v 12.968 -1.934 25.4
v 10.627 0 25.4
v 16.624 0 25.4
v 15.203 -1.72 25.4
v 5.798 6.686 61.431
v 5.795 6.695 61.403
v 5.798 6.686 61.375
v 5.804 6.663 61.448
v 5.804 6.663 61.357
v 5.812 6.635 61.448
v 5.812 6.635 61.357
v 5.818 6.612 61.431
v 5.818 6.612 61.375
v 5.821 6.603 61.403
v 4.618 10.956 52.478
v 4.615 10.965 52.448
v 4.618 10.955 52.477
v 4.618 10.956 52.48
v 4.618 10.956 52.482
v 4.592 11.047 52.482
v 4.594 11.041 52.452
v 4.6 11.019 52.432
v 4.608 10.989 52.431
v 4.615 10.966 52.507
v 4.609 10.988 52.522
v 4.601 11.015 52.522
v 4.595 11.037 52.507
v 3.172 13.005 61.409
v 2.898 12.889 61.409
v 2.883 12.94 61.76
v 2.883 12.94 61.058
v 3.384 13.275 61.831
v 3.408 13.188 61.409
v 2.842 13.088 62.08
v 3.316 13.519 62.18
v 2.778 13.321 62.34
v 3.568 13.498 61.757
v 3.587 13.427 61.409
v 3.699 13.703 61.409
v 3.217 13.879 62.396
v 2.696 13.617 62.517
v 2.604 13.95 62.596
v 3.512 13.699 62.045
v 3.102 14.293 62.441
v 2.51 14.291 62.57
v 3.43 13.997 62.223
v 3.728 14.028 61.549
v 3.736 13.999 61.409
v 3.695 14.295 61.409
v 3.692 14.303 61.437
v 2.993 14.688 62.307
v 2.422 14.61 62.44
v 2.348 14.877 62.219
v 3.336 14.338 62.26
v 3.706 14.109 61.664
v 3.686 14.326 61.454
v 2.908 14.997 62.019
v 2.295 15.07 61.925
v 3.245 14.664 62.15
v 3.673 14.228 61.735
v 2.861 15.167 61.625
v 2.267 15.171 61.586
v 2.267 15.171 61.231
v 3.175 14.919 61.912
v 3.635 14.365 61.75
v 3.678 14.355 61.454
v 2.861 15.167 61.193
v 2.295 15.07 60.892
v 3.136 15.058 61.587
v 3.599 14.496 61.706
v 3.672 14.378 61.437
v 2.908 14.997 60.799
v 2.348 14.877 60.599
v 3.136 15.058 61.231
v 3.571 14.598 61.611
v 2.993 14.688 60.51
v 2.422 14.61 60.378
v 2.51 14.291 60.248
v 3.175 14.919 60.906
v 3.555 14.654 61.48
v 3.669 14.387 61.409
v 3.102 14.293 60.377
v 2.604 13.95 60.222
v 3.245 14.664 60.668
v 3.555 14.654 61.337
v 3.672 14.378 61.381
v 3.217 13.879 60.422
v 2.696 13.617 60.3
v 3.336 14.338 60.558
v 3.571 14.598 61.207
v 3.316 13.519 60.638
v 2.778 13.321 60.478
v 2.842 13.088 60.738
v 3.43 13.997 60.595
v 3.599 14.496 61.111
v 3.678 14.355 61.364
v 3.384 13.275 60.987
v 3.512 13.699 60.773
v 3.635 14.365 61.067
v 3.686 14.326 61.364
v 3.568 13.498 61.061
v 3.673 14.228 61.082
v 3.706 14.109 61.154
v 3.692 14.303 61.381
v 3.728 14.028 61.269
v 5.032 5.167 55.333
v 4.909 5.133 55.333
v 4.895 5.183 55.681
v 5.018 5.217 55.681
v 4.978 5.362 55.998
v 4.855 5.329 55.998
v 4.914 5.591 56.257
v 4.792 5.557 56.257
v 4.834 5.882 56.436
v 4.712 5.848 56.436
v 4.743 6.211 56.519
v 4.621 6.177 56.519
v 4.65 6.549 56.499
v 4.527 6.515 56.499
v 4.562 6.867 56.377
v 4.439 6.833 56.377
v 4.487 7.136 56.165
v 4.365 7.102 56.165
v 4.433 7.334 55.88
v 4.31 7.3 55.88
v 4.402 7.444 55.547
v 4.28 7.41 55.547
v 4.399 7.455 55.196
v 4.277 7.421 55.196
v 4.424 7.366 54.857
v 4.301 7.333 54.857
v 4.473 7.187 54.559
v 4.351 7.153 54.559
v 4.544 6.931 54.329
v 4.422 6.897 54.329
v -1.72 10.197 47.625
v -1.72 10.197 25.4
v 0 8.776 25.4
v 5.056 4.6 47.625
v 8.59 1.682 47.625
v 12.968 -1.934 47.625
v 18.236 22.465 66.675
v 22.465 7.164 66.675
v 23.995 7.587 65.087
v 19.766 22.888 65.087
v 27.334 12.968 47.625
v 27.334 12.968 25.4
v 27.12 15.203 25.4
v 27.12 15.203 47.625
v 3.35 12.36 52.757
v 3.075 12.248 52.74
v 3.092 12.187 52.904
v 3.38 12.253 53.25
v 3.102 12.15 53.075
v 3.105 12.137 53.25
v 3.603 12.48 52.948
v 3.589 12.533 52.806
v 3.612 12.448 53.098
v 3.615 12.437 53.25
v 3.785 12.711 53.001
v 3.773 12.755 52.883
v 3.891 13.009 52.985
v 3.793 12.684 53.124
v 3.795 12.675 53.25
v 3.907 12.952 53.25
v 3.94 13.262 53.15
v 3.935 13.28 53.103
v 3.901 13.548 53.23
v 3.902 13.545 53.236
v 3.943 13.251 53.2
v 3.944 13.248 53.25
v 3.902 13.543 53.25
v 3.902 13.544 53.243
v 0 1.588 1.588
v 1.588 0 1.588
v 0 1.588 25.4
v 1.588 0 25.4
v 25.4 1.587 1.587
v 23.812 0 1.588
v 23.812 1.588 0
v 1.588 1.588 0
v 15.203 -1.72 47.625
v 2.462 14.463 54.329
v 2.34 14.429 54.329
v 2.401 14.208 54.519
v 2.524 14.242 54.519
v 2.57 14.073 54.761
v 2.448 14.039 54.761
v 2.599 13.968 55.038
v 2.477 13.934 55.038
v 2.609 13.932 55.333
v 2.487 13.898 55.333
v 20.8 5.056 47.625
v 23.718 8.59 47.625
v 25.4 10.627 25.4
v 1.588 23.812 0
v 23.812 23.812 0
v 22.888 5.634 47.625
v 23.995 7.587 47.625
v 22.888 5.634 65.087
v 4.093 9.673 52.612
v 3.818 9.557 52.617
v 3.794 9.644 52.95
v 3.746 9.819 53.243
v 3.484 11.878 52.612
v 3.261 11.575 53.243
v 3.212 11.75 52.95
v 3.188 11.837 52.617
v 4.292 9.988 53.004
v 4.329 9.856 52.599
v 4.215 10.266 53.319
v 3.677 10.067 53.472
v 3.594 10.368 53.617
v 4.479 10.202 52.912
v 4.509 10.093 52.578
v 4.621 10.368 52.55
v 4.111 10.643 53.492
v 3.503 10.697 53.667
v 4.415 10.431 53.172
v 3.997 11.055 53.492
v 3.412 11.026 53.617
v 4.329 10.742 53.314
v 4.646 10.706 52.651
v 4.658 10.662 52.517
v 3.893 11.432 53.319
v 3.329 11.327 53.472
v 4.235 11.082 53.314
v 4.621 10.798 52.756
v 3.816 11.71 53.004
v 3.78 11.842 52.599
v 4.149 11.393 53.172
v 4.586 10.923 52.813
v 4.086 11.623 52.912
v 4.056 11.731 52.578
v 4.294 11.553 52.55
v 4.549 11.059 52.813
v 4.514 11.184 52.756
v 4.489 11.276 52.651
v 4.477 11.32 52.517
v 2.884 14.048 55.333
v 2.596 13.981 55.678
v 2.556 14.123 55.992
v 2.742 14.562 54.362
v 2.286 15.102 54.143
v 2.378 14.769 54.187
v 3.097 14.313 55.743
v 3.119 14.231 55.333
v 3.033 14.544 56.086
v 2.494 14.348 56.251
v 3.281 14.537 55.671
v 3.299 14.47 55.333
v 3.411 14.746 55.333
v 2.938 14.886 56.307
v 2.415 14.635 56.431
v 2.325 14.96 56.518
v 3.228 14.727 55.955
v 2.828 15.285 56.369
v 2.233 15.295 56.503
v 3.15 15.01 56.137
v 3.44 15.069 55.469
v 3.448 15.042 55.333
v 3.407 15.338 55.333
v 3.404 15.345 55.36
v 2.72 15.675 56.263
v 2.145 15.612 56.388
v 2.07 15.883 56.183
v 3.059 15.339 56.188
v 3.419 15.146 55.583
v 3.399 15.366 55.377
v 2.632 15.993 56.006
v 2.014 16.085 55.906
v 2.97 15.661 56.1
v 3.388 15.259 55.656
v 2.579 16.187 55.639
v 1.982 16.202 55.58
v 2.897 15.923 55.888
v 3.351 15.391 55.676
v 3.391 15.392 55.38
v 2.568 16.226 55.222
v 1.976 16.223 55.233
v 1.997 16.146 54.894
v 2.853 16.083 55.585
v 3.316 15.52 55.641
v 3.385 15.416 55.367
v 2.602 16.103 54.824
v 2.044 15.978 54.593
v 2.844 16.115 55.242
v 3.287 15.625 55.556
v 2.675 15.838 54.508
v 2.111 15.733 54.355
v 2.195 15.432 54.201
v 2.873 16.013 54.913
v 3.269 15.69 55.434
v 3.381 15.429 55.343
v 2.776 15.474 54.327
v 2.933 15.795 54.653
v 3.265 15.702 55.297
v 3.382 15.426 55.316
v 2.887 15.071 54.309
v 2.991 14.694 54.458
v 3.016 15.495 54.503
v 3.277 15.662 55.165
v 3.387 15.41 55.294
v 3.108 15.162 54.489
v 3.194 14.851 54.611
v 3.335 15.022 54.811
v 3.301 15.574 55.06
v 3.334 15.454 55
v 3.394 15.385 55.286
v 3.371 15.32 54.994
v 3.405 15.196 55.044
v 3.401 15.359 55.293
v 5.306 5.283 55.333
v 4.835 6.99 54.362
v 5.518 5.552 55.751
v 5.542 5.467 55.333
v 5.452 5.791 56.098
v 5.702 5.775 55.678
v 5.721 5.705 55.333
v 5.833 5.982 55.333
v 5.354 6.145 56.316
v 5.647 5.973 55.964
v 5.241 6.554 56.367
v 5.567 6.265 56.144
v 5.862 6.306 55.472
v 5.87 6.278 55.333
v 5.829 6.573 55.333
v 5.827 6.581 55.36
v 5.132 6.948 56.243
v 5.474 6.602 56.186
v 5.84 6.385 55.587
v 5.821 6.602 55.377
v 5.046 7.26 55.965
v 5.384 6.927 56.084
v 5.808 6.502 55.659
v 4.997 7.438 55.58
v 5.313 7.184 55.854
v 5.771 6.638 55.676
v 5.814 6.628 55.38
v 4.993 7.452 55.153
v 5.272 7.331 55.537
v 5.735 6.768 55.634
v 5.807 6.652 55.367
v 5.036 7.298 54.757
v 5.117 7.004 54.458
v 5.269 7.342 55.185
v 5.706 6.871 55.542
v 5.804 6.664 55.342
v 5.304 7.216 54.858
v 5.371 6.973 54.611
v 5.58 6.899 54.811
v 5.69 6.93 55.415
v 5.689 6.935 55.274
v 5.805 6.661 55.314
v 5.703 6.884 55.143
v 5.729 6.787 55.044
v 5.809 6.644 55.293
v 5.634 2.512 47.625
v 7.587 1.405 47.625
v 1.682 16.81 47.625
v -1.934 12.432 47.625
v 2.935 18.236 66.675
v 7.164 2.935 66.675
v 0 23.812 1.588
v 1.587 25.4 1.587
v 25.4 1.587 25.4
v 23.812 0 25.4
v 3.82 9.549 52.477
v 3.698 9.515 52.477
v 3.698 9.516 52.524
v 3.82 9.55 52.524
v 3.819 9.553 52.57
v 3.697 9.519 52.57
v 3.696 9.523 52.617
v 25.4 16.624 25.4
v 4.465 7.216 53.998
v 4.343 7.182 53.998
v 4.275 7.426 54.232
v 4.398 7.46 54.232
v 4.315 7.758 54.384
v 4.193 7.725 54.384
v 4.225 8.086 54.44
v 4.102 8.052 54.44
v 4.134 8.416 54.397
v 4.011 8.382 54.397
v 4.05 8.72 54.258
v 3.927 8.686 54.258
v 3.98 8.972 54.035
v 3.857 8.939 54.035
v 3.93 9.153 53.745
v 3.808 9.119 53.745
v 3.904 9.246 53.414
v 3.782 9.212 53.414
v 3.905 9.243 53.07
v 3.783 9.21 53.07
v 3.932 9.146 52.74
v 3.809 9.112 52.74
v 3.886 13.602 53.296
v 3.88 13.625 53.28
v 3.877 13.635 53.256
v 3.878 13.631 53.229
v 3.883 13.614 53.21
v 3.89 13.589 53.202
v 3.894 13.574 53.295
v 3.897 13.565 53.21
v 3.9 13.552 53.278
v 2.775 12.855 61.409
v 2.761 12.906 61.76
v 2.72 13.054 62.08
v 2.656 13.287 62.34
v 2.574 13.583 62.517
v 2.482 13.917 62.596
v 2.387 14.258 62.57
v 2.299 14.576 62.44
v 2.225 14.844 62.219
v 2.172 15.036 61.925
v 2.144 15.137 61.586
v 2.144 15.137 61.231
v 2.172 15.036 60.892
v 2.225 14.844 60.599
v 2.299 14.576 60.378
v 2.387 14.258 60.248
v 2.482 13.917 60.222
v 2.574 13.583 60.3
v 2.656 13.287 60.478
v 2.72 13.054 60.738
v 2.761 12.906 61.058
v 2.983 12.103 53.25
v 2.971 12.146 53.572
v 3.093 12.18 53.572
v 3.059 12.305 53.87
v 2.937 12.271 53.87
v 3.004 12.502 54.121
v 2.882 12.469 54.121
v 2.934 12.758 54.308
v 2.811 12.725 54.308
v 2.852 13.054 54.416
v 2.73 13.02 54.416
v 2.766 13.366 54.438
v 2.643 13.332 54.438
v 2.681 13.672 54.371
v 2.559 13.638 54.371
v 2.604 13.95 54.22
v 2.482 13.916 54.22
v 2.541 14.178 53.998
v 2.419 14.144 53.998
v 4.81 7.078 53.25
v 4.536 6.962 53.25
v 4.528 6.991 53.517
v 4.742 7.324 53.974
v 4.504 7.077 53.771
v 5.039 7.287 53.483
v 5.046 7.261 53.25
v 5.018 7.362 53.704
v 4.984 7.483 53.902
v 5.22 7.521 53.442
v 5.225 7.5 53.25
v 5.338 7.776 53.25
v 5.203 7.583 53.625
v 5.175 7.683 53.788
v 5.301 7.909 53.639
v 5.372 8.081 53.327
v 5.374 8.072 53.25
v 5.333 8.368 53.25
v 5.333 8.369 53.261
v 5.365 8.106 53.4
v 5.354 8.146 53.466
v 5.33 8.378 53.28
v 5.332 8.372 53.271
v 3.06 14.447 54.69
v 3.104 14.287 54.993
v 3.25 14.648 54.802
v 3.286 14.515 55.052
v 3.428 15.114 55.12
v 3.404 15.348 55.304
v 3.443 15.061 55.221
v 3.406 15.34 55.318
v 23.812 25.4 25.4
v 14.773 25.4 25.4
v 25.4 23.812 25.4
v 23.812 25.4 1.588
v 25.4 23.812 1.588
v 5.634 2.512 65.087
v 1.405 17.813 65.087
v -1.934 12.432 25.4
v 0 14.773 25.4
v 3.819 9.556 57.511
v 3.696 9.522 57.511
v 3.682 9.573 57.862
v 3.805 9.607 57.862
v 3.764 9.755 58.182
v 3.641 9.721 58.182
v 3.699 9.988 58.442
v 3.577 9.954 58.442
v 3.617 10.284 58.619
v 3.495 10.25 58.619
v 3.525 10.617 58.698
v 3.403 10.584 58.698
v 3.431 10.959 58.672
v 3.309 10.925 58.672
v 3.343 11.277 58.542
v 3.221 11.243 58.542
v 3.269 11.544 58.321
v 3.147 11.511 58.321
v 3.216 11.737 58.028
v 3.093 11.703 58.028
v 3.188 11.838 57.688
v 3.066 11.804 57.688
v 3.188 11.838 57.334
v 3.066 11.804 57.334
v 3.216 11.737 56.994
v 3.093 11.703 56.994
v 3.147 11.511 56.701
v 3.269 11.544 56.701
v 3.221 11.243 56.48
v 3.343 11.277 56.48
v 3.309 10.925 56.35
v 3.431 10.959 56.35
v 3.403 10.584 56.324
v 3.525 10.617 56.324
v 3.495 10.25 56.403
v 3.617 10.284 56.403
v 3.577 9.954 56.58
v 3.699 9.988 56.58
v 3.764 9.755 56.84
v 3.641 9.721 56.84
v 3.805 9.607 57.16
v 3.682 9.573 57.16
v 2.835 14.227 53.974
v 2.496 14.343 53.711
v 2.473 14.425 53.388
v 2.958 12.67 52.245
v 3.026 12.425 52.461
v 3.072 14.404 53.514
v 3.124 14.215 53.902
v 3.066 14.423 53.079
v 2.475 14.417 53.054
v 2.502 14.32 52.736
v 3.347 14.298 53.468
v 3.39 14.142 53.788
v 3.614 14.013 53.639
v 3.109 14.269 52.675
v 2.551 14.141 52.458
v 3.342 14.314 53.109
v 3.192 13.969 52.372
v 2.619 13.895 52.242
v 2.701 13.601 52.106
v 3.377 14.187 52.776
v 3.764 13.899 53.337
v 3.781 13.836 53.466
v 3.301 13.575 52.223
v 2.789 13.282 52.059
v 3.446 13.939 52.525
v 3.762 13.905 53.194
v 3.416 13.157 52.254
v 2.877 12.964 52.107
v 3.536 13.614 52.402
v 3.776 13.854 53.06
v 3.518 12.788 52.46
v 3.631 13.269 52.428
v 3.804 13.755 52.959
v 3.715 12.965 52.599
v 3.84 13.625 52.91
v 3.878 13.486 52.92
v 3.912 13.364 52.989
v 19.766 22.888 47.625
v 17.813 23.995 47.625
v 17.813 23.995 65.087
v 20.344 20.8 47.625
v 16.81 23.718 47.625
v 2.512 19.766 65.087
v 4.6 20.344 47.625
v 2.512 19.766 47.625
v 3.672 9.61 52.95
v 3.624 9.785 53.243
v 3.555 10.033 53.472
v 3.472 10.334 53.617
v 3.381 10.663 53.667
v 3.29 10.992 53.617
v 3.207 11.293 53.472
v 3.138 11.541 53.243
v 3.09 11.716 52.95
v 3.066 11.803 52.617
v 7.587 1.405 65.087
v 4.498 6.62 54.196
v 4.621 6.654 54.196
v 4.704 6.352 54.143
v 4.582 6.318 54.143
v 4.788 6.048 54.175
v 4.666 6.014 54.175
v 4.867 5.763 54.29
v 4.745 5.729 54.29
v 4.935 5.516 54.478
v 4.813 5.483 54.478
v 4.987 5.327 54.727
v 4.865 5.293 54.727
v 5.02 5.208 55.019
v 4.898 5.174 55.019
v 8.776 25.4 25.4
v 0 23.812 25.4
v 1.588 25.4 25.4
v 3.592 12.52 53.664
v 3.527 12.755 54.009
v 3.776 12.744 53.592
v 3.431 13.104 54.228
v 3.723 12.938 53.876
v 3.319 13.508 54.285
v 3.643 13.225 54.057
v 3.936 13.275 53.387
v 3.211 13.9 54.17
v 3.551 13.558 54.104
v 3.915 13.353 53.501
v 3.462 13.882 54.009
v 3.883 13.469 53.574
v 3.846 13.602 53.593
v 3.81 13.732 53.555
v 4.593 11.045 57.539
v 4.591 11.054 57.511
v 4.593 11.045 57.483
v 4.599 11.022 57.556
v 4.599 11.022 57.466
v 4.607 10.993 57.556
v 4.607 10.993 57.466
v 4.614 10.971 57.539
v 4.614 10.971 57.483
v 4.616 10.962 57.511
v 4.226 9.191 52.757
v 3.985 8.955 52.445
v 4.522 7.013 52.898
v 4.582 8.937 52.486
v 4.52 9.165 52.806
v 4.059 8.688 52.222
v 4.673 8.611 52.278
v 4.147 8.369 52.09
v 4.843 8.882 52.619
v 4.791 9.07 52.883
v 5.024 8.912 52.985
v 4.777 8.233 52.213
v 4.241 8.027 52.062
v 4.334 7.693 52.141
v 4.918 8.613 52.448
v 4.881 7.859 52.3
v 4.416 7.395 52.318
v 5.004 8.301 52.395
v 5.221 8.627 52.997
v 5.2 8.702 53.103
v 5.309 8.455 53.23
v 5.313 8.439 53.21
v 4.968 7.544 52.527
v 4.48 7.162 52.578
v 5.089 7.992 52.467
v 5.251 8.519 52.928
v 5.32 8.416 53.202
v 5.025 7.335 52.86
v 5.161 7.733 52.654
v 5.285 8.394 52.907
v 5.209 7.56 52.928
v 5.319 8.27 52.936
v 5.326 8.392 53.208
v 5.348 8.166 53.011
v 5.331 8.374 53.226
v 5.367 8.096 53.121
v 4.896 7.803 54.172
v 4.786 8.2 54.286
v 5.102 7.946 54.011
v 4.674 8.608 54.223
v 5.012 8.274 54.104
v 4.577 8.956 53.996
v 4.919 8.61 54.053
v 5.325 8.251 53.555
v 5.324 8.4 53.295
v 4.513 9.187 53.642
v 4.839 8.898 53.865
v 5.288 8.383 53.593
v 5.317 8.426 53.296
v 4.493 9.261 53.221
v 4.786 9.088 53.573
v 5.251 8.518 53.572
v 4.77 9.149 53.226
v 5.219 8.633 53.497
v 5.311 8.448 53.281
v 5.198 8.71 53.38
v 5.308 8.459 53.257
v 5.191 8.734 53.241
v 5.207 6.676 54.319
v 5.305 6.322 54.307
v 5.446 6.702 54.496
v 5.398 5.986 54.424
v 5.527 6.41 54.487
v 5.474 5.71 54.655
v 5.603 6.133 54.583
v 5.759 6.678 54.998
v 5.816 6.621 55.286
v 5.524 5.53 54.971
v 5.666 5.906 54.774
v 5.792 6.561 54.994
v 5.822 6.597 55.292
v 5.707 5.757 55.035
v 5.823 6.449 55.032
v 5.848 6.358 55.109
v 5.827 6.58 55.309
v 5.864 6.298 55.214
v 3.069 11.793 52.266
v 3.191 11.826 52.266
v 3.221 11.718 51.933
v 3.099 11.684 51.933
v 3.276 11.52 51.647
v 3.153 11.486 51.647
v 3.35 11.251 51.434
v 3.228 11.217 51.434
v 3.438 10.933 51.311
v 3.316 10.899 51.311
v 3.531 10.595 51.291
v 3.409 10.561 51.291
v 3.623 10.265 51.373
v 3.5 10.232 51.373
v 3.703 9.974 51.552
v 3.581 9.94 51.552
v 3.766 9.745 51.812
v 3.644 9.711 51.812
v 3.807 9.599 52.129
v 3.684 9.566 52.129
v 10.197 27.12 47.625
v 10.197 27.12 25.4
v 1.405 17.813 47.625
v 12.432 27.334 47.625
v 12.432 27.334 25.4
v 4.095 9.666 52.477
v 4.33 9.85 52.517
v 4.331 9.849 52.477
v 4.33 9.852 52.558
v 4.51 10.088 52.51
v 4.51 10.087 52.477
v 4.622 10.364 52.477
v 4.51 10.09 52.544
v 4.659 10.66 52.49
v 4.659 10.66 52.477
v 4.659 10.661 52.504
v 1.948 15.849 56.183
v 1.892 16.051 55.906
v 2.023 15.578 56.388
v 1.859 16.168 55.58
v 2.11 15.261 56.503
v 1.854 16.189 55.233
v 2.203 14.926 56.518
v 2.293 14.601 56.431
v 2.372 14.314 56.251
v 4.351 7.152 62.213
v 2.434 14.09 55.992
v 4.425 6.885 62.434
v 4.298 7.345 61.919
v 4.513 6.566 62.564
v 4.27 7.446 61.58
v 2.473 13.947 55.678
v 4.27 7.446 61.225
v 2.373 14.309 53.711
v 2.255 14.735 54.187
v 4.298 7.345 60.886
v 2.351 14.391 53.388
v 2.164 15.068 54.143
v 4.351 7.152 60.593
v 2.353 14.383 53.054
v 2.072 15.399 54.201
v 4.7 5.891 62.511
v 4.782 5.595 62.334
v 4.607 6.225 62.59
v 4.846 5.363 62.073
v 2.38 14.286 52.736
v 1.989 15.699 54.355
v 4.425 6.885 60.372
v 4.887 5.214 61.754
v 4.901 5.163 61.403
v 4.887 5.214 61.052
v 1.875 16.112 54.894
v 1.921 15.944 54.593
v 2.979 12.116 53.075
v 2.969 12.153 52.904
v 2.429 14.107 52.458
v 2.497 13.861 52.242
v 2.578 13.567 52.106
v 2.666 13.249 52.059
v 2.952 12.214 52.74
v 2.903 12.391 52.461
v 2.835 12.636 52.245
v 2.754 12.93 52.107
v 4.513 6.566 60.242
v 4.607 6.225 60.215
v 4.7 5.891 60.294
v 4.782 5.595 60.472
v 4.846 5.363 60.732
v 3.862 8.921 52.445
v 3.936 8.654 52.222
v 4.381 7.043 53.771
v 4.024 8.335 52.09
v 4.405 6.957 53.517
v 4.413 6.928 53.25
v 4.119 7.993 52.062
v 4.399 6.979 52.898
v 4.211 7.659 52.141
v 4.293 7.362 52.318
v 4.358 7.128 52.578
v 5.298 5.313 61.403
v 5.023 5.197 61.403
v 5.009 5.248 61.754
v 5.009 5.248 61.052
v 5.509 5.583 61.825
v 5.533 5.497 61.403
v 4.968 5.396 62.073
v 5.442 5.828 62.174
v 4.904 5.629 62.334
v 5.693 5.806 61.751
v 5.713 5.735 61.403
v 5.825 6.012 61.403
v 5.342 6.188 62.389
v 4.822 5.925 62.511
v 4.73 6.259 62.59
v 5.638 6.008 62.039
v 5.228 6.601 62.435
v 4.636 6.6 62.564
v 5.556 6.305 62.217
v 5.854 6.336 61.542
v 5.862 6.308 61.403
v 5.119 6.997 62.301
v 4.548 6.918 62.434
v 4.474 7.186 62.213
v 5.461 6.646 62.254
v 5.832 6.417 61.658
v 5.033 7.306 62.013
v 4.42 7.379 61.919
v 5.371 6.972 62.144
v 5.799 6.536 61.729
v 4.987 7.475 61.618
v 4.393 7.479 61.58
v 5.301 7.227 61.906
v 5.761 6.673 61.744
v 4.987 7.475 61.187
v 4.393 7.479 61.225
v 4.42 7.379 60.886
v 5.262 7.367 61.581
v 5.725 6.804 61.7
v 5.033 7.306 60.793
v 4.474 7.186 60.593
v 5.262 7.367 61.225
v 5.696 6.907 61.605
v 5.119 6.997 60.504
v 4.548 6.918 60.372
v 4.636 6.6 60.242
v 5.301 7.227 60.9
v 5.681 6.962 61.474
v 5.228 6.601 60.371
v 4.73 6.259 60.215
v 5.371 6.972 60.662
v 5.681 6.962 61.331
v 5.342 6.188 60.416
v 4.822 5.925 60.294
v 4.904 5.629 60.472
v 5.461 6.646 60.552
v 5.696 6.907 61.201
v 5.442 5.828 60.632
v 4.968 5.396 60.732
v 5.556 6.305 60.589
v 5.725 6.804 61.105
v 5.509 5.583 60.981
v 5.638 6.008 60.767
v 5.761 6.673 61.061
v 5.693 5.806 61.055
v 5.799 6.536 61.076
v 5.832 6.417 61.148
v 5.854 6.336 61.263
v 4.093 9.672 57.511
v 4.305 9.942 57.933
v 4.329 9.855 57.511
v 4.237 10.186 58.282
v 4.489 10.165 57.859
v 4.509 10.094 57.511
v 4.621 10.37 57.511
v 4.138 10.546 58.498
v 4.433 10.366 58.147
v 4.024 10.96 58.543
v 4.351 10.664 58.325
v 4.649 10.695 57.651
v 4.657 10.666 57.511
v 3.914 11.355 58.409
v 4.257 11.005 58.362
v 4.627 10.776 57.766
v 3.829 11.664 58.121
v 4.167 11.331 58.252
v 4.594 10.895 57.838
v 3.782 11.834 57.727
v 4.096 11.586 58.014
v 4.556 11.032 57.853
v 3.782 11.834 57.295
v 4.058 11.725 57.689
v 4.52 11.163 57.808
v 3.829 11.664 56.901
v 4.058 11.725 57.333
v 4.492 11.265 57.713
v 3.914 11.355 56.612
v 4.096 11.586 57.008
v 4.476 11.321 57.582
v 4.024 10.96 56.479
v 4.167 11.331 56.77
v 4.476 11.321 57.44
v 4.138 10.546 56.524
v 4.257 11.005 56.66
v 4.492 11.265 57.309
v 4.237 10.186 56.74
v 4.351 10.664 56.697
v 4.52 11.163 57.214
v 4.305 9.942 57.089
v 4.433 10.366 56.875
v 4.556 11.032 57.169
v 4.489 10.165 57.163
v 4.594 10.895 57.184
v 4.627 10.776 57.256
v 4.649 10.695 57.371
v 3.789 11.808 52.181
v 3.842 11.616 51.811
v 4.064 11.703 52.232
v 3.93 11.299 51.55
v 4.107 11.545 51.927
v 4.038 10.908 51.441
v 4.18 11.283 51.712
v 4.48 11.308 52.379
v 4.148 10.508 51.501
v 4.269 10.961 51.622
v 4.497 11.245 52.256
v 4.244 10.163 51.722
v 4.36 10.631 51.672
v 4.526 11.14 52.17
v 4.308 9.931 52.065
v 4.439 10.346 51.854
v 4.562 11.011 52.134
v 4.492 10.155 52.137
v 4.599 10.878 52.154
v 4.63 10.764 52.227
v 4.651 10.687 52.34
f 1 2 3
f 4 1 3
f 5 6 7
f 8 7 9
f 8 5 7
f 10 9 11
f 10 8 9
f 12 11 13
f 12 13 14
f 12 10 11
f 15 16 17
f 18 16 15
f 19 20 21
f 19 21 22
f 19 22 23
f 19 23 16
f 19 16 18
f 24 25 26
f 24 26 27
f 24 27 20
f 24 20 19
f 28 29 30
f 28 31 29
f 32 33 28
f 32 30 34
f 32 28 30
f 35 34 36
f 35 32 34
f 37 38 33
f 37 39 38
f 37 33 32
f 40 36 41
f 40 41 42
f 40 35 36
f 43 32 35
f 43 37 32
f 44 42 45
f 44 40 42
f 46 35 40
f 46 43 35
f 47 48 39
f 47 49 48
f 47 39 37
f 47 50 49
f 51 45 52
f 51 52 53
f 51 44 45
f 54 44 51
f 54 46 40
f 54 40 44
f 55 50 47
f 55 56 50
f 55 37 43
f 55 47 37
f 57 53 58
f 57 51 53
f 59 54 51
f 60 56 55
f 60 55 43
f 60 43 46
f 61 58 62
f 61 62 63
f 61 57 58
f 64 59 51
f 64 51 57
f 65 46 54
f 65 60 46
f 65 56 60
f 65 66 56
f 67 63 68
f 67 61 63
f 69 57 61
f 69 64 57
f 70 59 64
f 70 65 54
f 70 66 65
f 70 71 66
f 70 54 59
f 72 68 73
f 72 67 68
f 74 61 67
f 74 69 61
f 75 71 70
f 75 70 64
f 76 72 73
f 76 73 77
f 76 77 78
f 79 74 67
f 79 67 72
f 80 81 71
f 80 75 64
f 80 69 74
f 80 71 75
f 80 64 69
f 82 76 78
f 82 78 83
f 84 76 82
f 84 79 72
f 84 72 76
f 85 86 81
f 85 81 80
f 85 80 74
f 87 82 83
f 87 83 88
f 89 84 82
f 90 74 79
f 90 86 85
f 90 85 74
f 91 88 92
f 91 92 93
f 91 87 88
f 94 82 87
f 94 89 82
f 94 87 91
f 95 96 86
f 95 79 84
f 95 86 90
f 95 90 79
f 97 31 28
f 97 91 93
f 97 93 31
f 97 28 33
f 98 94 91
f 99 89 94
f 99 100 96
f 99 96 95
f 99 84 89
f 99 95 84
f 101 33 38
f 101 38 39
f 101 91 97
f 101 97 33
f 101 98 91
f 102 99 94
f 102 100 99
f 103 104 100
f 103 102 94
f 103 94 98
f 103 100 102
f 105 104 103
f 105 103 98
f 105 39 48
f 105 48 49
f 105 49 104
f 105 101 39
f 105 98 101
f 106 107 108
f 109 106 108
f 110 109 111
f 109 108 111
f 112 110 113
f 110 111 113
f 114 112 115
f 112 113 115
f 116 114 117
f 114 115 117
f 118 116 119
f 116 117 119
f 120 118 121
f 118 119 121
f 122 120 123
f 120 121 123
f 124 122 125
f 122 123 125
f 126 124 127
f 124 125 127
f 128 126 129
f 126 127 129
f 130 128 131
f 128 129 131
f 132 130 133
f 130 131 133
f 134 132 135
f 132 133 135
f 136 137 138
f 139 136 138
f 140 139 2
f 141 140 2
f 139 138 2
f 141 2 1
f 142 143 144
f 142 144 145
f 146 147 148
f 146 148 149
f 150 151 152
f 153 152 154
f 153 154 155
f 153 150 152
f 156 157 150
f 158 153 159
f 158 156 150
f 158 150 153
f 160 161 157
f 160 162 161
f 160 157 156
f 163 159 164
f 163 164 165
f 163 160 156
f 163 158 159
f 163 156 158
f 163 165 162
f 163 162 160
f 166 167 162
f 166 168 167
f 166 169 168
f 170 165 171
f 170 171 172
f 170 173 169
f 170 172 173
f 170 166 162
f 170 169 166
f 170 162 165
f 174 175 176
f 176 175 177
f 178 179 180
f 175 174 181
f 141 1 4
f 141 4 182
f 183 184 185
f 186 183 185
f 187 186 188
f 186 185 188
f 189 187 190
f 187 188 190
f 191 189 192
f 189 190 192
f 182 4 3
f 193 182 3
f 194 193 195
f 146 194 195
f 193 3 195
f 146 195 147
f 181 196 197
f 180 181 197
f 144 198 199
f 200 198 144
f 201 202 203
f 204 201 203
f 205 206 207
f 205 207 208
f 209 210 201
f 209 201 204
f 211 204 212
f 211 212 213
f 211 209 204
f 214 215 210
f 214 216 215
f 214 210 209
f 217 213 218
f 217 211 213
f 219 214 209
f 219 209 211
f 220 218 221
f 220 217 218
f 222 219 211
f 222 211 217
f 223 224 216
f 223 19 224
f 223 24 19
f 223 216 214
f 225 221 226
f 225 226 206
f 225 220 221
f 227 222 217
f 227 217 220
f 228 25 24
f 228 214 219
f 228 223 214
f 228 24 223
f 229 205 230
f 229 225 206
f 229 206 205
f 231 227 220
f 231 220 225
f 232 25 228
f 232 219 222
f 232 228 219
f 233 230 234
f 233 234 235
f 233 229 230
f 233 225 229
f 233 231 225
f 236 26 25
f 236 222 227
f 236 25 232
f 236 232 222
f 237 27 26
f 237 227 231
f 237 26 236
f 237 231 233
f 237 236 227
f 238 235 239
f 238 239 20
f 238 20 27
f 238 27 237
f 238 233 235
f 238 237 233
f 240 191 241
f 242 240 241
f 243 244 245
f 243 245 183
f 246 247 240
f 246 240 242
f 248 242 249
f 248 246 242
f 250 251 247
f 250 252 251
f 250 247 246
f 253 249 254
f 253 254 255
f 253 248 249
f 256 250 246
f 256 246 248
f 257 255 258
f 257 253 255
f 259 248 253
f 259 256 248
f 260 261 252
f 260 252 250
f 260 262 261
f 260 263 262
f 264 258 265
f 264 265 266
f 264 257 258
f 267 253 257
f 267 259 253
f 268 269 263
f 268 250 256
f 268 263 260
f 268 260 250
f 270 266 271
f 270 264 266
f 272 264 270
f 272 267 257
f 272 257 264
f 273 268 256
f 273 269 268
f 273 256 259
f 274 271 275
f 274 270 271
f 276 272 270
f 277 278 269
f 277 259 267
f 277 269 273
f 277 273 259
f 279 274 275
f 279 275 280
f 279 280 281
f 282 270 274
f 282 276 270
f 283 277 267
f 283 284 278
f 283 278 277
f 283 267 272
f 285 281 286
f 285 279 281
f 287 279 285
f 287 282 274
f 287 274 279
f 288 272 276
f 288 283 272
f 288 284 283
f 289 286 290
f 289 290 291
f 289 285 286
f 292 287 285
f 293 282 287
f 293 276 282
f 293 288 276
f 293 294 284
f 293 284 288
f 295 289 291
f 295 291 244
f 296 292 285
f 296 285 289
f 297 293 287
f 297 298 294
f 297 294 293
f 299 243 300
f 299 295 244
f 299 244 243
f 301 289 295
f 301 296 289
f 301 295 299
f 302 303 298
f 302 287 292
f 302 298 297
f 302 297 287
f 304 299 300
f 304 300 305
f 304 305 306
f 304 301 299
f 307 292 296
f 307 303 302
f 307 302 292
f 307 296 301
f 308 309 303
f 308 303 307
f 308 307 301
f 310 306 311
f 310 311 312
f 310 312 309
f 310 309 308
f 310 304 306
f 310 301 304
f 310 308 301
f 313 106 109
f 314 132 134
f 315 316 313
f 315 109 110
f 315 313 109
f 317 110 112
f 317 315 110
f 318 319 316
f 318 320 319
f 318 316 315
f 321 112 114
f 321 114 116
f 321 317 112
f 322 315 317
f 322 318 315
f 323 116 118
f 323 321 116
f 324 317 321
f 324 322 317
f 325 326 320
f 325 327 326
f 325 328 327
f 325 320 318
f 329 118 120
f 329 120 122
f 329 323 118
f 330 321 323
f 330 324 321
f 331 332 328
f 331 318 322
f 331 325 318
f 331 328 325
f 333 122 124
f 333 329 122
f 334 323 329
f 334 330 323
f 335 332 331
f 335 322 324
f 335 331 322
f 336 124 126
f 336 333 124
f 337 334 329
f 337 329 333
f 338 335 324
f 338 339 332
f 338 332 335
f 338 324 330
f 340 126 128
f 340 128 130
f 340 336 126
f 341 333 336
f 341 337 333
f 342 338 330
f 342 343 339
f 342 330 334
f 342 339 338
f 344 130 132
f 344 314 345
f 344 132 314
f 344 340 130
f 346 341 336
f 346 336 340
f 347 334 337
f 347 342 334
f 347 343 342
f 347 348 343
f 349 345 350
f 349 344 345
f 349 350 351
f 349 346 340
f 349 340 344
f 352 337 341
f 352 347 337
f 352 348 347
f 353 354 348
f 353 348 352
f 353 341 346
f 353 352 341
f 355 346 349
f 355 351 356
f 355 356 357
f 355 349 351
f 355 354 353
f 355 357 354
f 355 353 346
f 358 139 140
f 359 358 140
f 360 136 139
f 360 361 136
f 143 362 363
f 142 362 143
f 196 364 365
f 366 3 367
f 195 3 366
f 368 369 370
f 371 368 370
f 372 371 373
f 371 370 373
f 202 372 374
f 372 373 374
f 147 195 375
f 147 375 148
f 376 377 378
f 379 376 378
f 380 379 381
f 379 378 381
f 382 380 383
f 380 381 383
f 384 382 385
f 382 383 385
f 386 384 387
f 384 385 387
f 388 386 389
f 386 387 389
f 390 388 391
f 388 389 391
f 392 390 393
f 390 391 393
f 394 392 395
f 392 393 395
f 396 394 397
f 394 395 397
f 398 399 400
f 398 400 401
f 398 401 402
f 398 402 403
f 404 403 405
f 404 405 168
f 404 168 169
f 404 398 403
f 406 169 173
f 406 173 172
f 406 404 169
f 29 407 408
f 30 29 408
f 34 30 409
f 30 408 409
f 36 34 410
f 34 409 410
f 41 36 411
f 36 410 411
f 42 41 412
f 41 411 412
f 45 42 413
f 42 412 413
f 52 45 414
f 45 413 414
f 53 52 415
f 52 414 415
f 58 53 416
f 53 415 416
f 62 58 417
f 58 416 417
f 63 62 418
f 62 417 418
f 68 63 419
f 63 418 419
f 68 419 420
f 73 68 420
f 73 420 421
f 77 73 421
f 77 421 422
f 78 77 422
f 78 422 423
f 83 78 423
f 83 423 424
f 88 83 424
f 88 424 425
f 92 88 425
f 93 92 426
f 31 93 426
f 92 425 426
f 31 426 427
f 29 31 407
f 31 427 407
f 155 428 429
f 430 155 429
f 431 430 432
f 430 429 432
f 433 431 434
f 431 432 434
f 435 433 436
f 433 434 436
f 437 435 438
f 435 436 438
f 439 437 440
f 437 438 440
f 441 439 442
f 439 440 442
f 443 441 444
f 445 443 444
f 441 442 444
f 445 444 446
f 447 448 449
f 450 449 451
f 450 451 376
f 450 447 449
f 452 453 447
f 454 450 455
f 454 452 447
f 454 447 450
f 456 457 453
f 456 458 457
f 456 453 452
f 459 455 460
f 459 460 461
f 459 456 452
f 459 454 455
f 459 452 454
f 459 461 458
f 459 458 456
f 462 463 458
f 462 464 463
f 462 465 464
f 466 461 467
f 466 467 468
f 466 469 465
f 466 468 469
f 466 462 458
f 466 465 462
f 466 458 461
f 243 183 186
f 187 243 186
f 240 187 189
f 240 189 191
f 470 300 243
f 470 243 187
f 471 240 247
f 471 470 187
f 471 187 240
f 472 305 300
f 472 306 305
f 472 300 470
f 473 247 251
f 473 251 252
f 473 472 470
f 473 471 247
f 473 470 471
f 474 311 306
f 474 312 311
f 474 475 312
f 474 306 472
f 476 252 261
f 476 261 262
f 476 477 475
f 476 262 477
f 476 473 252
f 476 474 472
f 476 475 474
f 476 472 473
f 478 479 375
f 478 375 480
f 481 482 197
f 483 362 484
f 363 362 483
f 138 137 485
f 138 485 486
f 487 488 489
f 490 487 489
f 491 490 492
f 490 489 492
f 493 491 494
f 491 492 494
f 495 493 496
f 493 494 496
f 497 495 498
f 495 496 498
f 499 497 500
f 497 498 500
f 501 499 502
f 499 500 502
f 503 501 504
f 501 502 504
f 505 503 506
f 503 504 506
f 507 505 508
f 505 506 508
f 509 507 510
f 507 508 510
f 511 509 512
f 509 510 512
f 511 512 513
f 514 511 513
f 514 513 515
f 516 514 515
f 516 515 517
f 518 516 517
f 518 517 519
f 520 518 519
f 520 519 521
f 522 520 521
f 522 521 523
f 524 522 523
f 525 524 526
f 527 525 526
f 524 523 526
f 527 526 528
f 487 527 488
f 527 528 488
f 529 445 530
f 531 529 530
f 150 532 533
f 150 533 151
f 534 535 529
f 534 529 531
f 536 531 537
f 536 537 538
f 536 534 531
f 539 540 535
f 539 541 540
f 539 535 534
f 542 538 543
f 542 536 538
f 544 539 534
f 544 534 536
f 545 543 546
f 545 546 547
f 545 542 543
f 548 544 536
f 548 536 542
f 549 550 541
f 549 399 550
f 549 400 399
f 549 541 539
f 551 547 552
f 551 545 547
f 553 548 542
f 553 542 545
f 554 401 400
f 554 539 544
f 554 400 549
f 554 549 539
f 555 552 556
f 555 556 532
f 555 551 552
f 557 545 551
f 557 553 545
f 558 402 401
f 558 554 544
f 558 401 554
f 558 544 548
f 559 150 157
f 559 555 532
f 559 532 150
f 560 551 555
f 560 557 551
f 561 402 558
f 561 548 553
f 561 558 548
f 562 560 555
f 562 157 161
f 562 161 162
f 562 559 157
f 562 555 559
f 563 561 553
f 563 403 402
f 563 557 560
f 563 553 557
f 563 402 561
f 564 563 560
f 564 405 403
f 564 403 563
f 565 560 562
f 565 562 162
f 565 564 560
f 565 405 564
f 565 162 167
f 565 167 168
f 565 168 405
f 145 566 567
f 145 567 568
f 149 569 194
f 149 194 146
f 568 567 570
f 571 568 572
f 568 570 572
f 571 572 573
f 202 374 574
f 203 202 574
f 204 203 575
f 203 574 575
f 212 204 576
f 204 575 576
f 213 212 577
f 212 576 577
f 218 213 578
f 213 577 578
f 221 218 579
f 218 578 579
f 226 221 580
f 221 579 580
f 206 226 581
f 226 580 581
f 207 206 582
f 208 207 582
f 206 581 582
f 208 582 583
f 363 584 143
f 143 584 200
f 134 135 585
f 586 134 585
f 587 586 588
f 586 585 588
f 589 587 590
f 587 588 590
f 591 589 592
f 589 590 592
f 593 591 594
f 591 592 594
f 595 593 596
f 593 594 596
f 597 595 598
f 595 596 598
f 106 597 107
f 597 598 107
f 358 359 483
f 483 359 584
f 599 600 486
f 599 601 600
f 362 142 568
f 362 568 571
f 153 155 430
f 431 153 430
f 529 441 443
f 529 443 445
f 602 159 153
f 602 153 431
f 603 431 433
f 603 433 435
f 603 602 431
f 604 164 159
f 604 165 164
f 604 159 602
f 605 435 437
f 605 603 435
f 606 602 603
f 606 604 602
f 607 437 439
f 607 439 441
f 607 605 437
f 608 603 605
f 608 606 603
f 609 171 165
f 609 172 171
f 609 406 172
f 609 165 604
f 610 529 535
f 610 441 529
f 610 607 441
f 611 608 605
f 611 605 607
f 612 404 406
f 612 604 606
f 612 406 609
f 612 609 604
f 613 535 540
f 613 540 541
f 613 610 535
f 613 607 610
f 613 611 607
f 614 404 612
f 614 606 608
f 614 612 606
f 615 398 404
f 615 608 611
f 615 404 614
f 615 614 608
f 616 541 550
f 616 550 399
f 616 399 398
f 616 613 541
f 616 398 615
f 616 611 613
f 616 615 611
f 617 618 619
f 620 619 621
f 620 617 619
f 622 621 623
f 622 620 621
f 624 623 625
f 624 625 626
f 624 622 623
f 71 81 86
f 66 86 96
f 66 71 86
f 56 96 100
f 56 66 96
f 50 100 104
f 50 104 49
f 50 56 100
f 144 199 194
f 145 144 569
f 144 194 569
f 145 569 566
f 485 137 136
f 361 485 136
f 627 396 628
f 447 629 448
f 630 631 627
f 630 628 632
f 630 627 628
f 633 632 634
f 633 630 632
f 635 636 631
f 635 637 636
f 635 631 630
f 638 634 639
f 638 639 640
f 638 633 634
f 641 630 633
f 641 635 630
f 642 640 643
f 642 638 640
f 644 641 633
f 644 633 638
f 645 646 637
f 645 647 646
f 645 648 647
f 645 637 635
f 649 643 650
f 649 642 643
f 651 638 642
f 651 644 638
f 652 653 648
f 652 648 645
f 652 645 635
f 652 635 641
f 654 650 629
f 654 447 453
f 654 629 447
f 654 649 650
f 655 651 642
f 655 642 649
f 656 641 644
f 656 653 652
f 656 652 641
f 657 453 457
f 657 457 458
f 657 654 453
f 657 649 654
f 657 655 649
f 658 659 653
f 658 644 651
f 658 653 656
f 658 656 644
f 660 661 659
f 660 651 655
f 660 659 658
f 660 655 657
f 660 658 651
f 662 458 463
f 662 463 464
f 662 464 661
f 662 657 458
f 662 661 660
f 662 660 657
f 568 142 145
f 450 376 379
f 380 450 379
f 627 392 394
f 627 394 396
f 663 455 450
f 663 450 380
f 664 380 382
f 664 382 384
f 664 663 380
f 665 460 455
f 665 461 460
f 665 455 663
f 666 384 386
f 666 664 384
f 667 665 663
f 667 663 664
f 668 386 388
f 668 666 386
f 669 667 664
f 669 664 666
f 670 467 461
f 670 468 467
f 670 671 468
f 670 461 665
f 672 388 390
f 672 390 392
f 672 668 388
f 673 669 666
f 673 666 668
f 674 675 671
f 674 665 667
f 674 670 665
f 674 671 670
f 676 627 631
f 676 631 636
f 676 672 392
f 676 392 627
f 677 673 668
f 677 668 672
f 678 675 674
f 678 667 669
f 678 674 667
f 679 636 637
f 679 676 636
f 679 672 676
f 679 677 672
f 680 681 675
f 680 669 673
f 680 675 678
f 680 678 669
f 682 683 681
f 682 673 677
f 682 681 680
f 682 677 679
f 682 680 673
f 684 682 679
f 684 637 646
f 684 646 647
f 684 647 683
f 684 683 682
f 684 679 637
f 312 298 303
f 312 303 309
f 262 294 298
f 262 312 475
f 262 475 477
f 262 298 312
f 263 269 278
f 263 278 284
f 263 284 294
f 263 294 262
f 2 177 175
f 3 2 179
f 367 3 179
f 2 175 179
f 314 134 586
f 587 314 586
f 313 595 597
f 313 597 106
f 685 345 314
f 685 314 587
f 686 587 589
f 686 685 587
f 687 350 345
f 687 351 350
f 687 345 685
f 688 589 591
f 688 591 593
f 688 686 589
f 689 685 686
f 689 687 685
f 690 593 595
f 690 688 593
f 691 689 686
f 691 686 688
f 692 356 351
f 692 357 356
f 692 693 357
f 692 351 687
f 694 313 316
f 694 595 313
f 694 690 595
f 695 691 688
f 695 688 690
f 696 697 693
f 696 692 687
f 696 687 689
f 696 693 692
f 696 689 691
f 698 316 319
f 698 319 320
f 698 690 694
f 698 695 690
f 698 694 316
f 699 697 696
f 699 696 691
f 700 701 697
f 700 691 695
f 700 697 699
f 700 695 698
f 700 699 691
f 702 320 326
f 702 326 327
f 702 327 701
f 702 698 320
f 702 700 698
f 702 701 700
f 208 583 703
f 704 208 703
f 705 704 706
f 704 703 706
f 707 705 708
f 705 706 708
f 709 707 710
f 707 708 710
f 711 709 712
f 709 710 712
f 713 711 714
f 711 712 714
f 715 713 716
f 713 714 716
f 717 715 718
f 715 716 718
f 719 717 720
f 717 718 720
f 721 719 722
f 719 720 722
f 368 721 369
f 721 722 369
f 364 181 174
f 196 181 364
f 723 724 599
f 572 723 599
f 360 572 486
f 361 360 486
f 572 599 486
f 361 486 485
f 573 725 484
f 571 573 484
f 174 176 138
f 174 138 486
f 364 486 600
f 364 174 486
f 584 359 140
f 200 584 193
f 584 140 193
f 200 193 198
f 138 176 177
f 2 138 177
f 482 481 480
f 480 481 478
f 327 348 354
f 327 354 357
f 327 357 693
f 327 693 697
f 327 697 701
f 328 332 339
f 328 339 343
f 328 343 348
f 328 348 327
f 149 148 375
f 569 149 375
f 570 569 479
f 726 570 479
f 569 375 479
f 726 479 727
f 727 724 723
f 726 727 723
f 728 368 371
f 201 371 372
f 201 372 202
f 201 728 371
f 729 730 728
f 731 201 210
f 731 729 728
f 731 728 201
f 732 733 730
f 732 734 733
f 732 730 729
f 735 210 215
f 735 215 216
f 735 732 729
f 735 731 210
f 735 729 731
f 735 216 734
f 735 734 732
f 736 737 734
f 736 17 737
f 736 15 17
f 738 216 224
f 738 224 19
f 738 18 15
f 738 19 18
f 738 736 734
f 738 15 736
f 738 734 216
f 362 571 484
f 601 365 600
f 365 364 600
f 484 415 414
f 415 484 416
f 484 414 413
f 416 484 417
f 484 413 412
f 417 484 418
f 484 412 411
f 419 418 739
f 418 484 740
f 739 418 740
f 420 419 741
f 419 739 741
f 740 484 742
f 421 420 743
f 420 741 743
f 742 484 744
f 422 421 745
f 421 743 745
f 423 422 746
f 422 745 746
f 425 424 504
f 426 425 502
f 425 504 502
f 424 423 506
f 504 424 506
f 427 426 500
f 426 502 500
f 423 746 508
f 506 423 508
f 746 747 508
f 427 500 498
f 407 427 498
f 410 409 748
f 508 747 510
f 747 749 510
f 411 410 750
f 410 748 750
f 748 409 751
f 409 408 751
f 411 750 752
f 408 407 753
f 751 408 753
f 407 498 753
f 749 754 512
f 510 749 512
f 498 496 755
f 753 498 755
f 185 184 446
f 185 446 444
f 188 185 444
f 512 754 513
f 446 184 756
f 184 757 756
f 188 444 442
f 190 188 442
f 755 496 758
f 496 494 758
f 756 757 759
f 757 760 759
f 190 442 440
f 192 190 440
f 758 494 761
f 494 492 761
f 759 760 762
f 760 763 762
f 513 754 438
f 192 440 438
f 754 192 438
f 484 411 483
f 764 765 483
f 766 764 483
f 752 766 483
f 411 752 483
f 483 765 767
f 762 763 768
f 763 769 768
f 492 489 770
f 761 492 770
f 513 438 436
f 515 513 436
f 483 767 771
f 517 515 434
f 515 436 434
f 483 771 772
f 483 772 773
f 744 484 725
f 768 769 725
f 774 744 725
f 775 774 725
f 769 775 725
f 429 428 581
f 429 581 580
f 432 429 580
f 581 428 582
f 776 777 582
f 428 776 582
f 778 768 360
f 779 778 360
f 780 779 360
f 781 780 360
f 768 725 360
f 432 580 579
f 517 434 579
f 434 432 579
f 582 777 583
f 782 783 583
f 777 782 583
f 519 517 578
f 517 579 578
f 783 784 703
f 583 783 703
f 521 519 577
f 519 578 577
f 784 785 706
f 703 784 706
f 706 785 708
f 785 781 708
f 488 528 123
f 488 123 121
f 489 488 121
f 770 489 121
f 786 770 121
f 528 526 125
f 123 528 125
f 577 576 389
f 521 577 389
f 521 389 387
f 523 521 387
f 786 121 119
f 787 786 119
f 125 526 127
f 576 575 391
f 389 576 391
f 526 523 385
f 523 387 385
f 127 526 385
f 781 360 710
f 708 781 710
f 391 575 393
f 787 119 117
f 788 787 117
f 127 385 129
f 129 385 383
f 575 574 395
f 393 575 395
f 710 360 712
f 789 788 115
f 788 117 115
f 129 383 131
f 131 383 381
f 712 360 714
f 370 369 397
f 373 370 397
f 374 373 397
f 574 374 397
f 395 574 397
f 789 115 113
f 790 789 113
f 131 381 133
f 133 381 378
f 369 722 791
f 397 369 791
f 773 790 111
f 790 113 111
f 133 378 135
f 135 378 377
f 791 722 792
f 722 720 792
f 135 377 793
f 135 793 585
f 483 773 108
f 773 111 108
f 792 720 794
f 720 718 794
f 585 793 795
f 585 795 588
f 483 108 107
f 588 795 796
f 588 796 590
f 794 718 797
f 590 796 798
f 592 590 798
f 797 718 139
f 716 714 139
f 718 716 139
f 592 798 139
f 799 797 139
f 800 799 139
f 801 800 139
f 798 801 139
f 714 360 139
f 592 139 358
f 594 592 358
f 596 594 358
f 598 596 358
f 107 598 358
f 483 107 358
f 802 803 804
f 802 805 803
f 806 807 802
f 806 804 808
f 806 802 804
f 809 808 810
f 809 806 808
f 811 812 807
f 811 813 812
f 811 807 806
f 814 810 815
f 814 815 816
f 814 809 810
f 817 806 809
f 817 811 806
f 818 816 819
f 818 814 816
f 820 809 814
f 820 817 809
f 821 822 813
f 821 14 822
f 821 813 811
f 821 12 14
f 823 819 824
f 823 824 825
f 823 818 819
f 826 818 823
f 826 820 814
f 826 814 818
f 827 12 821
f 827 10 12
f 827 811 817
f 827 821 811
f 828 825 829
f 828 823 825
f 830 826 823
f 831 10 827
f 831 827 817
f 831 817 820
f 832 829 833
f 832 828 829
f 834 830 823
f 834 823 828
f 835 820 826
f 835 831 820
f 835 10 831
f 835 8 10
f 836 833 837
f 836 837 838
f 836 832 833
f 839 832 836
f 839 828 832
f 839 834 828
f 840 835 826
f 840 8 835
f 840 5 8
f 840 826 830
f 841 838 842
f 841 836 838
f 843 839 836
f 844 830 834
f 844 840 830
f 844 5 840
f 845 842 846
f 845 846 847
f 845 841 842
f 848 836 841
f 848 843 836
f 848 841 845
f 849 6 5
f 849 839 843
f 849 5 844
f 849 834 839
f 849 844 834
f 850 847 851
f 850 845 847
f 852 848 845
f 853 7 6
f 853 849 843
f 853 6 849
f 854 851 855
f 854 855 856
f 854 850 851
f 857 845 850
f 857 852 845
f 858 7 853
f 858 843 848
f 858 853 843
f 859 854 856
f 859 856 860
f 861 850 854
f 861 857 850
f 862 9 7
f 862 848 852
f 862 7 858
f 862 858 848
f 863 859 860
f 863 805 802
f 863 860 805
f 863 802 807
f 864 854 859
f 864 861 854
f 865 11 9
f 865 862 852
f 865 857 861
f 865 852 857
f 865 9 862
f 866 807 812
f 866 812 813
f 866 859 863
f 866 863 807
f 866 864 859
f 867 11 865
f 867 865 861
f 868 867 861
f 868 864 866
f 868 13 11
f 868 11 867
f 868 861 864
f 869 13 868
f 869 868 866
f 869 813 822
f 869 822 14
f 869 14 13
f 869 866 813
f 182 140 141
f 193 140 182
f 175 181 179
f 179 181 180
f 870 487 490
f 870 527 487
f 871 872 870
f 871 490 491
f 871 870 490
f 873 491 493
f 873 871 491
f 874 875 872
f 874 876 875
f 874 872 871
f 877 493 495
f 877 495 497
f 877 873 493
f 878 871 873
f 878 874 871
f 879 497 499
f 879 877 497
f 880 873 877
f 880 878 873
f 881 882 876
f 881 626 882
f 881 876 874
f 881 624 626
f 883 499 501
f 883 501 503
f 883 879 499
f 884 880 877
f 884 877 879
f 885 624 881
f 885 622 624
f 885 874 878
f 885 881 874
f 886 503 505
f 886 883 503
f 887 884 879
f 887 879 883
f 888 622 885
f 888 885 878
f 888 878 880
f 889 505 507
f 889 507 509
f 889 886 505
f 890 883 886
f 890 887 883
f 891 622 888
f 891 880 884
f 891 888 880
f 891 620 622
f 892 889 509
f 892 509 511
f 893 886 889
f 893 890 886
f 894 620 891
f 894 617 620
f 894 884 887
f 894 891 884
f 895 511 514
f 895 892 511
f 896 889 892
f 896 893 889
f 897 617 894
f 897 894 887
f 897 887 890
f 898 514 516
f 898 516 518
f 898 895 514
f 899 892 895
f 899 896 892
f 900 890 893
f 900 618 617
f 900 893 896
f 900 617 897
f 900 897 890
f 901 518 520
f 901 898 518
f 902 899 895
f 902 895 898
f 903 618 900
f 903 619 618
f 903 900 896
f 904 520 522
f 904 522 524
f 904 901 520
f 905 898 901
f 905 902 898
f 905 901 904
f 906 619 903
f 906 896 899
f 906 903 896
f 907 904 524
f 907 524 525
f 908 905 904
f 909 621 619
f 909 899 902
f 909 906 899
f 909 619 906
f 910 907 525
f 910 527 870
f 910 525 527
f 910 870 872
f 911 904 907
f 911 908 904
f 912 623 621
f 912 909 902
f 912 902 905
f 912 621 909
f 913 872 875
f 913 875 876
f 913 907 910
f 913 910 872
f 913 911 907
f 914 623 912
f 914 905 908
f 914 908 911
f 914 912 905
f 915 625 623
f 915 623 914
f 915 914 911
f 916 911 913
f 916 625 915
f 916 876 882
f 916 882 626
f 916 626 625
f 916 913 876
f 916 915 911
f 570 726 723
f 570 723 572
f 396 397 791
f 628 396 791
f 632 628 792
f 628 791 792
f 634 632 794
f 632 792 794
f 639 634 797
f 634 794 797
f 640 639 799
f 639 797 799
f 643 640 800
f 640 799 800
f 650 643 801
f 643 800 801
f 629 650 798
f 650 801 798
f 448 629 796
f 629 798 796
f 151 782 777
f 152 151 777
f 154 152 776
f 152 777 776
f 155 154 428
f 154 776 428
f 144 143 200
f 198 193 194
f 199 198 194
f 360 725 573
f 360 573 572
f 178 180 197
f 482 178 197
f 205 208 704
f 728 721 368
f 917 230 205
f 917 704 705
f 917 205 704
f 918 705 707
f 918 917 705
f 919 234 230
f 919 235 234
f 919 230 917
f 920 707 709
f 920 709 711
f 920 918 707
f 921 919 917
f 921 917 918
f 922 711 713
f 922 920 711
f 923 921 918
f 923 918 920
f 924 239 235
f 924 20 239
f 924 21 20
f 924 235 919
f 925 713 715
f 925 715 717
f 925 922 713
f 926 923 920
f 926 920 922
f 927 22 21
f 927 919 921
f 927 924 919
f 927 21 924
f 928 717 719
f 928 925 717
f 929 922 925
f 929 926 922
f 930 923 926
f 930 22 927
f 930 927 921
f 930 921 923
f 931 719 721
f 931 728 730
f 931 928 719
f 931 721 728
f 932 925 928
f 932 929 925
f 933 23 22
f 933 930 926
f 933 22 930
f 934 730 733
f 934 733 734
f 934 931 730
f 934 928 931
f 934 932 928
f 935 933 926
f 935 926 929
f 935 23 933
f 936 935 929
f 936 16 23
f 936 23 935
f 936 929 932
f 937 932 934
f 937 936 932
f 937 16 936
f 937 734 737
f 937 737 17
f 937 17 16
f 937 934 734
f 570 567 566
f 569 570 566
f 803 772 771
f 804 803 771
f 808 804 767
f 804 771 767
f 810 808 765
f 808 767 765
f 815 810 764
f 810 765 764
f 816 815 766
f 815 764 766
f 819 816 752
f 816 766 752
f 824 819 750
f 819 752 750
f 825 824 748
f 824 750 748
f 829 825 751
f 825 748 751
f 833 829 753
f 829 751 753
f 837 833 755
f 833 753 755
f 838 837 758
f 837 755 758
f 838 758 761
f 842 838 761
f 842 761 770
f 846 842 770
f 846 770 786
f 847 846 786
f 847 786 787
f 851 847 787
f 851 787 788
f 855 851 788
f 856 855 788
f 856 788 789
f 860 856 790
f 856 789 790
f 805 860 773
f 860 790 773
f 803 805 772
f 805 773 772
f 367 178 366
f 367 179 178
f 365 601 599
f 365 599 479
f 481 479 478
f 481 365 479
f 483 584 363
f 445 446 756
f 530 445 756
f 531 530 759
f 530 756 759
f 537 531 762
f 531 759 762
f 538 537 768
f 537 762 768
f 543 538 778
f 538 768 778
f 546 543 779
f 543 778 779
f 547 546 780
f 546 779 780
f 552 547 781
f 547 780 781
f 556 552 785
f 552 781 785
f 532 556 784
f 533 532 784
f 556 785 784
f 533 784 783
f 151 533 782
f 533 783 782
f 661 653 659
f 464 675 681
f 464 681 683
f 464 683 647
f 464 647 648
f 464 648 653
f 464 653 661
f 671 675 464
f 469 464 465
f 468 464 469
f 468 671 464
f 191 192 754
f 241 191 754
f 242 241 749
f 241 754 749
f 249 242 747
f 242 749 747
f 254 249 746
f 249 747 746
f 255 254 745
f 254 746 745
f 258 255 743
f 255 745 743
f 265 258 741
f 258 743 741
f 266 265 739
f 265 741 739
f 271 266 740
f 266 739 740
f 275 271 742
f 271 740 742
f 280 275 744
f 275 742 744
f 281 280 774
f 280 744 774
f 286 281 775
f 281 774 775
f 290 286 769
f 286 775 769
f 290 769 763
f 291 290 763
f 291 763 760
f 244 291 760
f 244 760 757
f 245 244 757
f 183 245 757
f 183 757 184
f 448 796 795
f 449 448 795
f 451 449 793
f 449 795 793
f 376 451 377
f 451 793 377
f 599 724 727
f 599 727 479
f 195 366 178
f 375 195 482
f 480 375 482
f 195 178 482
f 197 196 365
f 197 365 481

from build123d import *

# Parameters (mm, degrees)
F0_W     = 25.4
F0_H     = 25.4
F1_DEPTH = 25.4
F3_DEPTH = 22.225
F5_DEPTH = 19.05
F6_SIZE  = 1.5875
F7_R     = 1.190625
F8_DEPTH = 1.27
F9_R     = 1.143


with BuildPart() as f1:
    # F0 (on Top) → F1 (new body)
    with BuildSketch(Plane.XY):
        with Locations((12.7, 12.7)):
            Rectangle(F0_W, F0_H)
    extrude(amount=F1_DEPTH)

    # F2 (on face) → F3 (join)
    with BuildSketch(Plane.XY.offset(25.4)):
        Polygon((11.2075299656, 28.3444189952), (-2.9444189952, 11.2075299656), (14.1924700344, -2.9444189952), (28.3444189952, 14.1924700344), align=None)
    extrude(amount=F3_DEPTH)

    # F4 (on face) → F5 (join)
    with BuildSketch(Plane.XY.offset(47.625)):
        Polygon((19.3434658997, 24.4181743817), (0.9818256183, 19.3434658997), (6.0565341003, 0.9818256183), (24.4181743817, 6.0565341003), align=None)
    extrude(amount=F5_DEPTH)

    # F6
    f6_edges = [f1.edges().sort_by_distance(p)[0] for p in [
        (0.981826, 19.343466, 57.15),
        (6.056534, 0.981826, 57.15),
        (15.237354, 3.51918, 66.675),
        (21.88082, 15.237354, 66.675),
        (10.162646, 21.88082, 66.675),
        (3.51918, 10.162646, 66.675),
        (19.343466, 24.418174, 57.15),
        (24.418174, 6.056534, 57.15),
        (28.344419, 14.19247, 36.5125),
        (11.20753, 28.344419, 36.5125),
        (-2.944419, 11.20753, 36.5125),
        (14.19247, -2.944419, 36.5125),
        (0, 0, 12.7),
        (25.4, 0, 12.7),
        (25.4, 25.4, 12.7),
        (0, 25.4, 12.7),
        (0, 12.7, 0),
        (12.7, 0, 0),
        (25.4, 12.7, 0),
        (12.7, 25.4, 0),
    ]]
    chamfer(f6_edges, length=F6_SIZE)

    # F7 (on face) → F8 (cut)
    with BuildSketch(Plane(origin=(5.8788405943, 1.6247678187, 0), x_dir=(0.2663888967, -0.9638656316, 0), z_dir=(-0.9638656316, -0.2663888967, 0))):
        with Locations((-12.8415566616, 61.4088140364)):
            Circle(F7_R)
        with Locations((-4.8616491402, 61.4027757647)):
            Circle(F7_R)
        with Locations((-9.3836337764, 57.5109797041)):
            Circle(F7_R)
        with BuildLine():
            ThreePointArc((-13.2842058157, 54.3290973754), (-12.8799494388, 54.7606037136), (-12.7331269976, 55.3333725229))
            ThreePointArc((-12.7331269976, 55.3333725229), (-14.9675545564, 55.9061413322), (-13.2842058157, 54.3290973754))
        make_face()
        with BuildLine():
            ThreePointArc((-3.6399269976, 55.3333725229), (-5.4033208069, 56.3771750817), (-5.4700981795, 54.3290973754))
            ThreePointArc((-5.4700981795, 54.3290973754), (-4.2577831883, 54.2895699641), (-3.6399269976, 55.3333725229))
        make_face()
        with BuildLine():
            ThreePointArc((-5.7659765017, 53.9980164002), (-7.3257898947, 54.2582033765), (-7.7681685223, 52.7399753853))
            ThreePointArc((-7.7681685223, 52.7399753853), (-6.692346284, 53.2500679279), (-5.7659765017, 53.9980164002))
        make_face()
        with BuildLine():
            ThreePointArc((-5.7659765017, 53.9980164002), (-6.692346284, 53.2500679279), (-7.7681685223, 52.7399753853))
            ThreePointArc((-7.7681685223, 52.7399753853), (-6.4309203498, 52.0884981403), (-5.501721284, 53.2500679279))
            ThreePointArc((-5.501721284, 53.2500679279), (-5.5697272674, 53.6466967649), (-5.7659765017, 53.9980164002))
        make_face()
        with BuildLine():
            ThreePointArc((-8.1948406932, 52.6170548731), (-9.3771519976, 53.6672239371), (-10.5594633021, 52.6170548731))
            ThreePointArc((-10.5594633021, 52.6170548731), (-9.3771519976, 52.4765989371), (-8.1948406932, 52.6170548731))
        make_face()
        with BuildLine():
            ThreePointArc((-8.1948406932, 52.6170548731), (-9.3771519976, 52.4765989371), (-10.5594633021, 52.6170548731))
            ThreePointArc((-10.5594633021, 52.6170548731), (-9.4475028816, 51.2880541782), (-8.1865269976, 52.4765989371))
            ThreePointArc((-8.1865269976, 52.4765989371), (-8.1886072388, 52.546949821), (-8.1948406932, 52.6170548731))
        make_face()
        with BuildLine():
            ThreePointArc((-10.8713327113, 53.2500679279), (-11.6653288744, 54.3726869445), (-12.9883274936, 53.9980164002))
            ThreePointArc((-12.9883274936, 53.9980164002), (-12.0619577113, 53.2500679279), (-10.986135473, 52.7399753853))
            ThreePointArc((-10.986135473, 52.7399753853), (-10.9003879237, 52.9886419938), (-10.8713327113, 53.2500679279))
        make_face()
        with BuildLine():
            ThreePointArc((-10.986135473, 52.7399753853), (-12.0619577113, 53.2500679279), (-12.9883274936, 53.9980164002))
            ThreePointArc((-12.9883274936, 53.9980164002), (-12.695401322, 52.2419324794), (-10.986135473, 52.7399753853))
        make_face()
    extrude(amount=-F8_DEPTH, mode=Mode.SUBTRACT)

    # F9
    f9_edges = [f1.edges().sort_by_distance(p)[0] for p in [
        (3.364933, 15.488219, 61.408814),
        (5.490691, 7.796661, 61.402776),
        (4.286085, 12.155246, 57.51098),
        (3.076648, 16.53131, 55.333373),
        (4.136553, 12.696292, 52.502119),
        (4.919935, 9.861807, 52.336143),
        (5.60677, 7.376656, 53.76016),
        (5.986513, 6.002648, 56.337648),
    ]]
    fillet(f9_edges, radius=F9_R)


solid = f1.part
